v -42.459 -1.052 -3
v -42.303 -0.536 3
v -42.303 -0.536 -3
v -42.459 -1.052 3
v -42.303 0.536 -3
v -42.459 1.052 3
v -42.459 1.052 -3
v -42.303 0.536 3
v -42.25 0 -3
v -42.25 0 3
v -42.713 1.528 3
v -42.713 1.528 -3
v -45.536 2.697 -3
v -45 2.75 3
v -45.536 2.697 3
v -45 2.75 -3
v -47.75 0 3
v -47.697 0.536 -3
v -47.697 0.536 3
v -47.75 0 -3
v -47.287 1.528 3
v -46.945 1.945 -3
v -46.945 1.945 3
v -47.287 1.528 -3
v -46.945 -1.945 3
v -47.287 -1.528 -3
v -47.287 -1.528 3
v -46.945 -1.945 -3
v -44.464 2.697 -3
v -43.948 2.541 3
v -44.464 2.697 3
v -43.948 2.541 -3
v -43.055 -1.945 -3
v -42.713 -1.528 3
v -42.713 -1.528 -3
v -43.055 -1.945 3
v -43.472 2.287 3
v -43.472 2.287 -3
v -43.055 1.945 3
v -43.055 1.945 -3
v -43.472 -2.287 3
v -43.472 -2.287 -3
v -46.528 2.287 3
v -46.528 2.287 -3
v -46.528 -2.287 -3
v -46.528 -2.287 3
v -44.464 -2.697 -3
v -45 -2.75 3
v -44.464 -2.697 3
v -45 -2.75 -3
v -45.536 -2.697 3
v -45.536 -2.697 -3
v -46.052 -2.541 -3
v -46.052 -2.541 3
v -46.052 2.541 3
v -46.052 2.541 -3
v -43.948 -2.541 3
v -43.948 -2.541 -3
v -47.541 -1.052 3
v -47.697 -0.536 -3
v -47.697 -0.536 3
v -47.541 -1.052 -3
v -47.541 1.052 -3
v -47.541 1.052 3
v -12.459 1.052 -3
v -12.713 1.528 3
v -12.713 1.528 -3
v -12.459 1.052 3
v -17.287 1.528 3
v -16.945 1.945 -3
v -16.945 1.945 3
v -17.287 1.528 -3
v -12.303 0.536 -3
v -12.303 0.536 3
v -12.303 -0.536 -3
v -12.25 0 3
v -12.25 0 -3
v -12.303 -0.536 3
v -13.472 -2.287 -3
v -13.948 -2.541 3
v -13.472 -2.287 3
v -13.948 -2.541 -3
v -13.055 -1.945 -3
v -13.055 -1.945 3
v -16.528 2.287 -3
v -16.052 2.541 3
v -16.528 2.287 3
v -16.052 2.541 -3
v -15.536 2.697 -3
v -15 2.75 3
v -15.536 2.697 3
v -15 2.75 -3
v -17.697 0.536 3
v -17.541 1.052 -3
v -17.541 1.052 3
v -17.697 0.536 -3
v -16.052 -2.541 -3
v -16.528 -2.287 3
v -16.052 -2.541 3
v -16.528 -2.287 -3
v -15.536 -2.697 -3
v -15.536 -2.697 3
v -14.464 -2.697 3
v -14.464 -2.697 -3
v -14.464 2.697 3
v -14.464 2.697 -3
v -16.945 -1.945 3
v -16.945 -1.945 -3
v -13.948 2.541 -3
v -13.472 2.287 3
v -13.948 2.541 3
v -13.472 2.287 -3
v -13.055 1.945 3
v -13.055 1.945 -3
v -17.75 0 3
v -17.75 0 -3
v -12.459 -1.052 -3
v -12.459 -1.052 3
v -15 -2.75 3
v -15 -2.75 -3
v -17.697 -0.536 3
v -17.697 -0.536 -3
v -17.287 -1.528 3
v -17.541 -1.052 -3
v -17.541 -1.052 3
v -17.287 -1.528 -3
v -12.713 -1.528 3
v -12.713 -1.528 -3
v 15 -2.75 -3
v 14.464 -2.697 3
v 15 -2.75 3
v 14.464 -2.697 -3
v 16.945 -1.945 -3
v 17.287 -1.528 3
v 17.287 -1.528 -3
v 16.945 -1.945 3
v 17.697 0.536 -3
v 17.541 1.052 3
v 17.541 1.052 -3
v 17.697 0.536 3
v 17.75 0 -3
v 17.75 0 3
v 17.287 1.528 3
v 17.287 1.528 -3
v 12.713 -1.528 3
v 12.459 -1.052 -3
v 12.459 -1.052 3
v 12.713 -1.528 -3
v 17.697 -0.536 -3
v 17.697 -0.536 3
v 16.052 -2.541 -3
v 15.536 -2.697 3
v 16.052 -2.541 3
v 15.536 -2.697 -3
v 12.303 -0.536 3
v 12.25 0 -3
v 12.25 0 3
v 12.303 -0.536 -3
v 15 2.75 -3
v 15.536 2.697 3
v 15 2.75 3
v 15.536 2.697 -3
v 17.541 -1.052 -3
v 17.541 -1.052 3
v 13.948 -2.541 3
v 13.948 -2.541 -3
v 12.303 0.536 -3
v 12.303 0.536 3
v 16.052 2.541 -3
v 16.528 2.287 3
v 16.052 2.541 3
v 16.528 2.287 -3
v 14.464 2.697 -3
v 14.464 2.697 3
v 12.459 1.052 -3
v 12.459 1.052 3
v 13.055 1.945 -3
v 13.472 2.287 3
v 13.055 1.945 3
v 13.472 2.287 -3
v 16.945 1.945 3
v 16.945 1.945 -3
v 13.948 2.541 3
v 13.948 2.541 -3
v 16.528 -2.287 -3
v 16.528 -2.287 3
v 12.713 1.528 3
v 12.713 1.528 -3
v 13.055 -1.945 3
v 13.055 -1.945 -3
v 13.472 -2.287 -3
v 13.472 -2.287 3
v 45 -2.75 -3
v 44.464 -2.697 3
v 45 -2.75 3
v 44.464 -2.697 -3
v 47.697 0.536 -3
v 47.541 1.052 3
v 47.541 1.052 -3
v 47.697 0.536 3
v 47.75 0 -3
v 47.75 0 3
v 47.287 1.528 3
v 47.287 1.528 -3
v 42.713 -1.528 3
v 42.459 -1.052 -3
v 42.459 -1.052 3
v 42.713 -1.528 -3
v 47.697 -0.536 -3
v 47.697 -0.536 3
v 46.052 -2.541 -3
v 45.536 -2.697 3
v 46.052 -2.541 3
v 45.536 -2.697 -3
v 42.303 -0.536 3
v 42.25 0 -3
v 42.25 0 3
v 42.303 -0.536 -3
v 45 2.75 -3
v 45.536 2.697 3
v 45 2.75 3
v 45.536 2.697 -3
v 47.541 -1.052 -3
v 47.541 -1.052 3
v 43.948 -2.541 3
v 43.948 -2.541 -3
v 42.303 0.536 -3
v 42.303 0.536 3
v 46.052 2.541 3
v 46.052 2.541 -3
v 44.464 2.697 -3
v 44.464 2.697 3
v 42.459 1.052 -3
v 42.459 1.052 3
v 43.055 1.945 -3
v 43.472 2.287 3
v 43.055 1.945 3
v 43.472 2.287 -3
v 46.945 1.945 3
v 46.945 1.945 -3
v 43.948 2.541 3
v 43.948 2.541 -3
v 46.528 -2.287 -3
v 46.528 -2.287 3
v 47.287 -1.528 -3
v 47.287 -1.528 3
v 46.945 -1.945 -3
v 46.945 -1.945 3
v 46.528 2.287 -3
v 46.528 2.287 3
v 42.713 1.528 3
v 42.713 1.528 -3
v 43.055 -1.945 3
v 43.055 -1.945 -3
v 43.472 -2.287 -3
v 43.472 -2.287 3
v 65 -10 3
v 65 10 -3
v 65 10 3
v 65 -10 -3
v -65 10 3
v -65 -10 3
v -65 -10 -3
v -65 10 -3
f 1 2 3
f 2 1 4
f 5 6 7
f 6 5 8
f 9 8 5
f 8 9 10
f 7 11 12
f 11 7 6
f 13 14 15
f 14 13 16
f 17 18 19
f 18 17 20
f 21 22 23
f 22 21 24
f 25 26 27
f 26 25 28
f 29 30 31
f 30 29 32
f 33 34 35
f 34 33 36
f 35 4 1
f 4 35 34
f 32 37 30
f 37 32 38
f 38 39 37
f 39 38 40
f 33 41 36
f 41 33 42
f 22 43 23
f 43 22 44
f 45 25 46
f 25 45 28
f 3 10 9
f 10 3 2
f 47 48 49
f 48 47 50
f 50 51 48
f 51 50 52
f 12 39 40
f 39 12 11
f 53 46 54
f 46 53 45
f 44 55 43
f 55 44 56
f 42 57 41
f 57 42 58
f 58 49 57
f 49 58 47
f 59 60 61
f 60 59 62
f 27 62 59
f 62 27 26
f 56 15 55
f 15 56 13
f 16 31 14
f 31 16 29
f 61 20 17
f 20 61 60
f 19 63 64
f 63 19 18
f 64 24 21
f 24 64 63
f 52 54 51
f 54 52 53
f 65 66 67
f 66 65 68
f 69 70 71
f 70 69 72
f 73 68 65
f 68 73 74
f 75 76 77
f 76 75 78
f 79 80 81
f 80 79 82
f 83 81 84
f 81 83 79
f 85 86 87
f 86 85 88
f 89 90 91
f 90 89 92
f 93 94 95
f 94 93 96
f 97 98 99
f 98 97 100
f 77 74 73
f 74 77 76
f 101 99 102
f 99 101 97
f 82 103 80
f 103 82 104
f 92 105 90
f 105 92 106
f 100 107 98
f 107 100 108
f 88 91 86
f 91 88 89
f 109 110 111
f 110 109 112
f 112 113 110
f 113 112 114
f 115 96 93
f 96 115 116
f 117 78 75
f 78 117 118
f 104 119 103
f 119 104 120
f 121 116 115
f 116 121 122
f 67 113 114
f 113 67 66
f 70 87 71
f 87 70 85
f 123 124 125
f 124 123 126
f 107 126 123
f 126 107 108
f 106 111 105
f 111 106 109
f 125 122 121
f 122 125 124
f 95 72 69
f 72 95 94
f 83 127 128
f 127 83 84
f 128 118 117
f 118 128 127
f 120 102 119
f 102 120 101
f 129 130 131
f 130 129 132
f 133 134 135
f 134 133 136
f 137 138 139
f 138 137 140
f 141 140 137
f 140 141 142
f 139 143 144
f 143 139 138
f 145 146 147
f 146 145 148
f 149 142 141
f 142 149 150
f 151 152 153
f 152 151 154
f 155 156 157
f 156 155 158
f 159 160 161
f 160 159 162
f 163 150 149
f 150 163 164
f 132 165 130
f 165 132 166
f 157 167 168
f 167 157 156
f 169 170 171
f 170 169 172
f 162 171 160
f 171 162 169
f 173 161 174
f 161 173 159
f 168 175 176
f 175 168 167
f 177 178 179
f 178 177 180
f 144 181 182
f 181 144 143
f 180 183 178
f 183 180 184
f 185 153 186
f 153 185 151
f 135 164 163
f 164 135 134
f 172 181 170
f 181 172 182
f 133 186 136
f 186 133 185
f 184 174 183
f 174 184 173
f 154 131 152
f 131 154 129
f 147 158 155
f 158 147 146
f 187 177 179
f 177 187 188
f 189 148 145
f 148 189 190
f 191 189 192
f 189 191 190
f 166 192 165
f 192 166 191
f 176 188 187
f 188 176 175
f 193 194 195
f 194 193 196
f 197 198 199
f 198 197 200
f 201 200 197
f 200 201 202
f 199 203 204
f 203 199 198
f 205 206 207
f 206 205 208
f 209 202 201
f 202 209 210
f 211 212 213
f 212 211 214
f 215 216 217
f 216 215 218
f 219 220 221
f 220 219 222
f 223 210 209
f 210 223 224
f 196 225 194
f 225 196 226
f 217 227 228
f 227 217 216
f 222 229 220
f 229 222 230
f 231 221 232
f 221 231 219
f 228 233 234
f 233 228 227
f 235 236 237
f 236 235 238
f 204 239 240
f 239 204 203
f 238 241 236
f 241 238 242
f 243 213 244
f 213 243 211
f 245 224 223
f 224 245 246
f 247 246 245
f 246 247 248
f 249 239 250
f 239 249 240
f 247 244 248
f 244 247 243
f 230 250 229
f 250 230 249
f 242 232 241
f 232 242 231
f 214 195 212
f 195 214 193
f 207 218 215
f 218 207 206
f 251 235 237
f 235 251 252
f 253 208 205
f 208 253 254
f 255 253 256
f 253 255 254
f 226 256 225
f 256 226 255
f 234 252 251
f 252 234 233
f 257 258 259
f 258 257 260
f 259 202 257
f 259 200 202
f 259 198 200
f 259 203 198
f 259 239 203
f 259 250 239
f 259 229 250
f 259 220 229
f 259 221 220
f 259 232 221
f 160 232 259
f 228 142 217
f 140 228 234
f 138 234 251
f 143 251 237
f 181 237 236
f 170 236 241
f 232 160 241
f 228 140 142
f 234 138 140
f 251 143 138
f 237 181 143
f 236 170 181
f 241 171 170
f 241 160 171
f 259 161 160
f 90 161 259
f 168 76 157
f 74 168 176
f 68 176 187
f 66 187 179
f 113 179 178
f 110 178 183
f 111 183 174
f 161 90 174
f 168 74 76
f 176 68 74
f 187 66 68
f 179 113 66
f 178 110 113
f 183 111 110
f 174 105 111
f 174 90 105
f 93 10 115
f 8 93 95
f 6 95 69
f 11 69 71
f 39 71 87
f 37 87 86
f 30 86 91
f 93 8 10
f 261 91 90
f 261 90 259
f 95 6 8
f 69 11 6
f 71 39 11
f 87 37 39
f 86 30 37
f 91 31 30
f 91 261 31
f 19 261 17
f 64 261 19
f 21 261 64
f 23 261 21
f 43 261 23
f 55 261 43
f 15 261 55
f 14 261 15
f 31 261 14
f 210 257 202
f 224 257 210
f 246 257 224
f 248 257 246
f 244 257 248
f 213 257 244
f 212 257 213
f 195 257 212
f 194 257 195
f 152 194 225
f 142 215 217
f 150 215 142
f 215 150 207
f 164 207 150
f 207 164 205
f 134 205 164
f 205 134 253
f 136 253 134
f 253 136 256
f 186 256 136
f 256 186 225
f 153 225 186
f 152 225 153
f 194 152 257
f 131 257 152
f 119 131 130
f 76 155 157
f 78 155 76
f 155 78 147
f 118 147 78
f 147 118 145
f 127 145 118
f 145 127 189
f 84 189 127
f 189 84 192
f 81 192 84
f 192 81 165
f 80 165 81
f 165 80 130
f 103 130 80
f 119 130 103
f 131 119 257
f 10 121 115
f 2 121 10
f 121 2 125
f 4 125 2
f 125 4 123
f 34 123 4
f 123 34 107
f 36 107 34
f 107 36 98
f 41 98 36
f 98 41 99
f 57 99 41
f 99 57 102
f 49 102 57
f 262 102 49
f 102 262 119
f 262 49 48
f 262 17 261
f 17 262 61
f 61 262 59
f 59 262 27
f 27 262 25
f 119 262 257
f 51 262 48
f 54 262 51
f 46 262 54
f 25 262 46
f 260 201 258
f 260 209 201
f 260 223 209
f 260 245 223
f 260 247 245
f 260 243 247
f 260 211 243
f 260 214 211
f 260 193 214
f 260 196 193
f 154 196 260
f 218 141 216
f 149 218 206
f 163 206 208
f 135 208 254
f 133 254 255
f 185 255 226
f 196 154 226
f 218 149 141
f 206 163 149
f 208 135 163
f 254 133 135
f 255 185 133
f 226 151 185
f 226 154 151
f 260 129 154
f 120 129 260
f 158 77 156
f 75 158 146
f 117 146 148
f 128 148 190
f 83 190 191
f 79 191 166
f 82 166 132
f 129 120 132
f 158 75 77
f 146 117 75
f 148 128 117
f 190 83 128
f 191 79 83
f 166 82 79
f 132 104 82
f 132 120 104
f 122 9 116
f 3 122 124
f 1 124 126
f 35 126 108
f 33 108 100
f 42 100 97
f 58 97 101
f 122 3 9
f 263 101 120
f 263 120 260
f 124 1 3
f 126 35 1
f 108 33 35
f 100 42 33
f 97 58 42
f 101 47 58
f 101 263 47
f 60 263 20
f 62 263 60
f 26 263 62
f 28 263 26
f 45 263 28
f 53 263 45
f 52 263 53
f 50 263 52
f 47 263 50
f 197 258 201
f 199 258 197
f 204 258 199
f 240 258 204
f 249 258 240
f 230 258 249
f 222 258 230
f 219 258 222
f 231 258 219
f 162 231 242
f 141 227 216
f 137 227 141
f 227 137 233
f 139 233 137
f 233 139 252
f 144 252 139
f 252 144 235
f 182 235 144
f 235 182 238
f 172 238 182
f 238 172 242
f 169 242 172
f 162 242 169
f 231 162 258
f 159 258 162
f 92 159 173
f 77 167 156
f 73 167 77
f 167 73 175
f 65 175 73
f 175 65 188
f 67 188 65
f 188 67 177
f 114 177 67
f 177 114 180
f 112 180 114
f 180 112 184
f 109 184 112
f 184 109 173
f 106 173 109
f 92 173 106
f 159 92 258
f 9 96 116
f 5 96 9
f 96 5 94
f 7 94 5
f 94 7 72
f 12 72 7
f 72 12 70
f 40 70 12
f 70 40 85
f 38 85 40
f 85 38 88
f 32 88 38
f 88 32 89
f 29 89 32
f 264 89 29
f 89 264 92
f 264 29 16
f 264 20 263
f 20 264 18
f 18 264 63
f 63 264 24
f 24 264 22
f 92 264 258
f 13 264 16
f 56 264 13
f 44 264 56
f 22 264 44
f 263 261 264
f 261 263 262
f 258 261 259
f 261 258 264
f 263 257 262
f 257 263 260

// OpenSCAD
$fn = 32;

// ----------------------------------------------------------------------
// Hole bar, 4 x Ø5.5
// skip layout, 20 mm edge offset
// ----------------------------------------------------------------------

// --- parameters (mm) ---
bar_w = 20;       // bar width (Y)
bar_t = 6;        // bar thickness (Z)
holes = 4;        // holes per row
hole_d = 5.5;     // hole diameter
edge = 20;        // offset from the bar end to the first hole
grid_pitch = 15;  // grid the bar was laid out on

// --- derived feature positions (mm) ---
pitch = grid_pitch * 2;       // = 30   holes sit every other grid slot
span = (holes - 1) * pitch;   // = 90   distance between the end holes
bar_l = span + 2 * edge;      // = 130   overall bar length
start_x = -bar_l / 2 + edge;  // = -45   X of the first hole
feature_centers = [
  [start_x + 0 * pitch, 0],
  [start_x + 1 * pitch, 0],
  [start_x + 2 * pitch, 0],
  [start_x + 3 * pitch, 0]
];   // hole centres of the first row

// bar with one row of holes, drilled from feature_centers
difference() {
  translate([-bar_l / 2, -bar_w / 2, -bar_t / 2]) cube([bar_l, bar_w, bar_t]);
  for (centre = feature_centers)
    translate([centre[0], centre[1], 0])
      cylinder(d = hole_d, h = bar_t + 2, center = true);
}
